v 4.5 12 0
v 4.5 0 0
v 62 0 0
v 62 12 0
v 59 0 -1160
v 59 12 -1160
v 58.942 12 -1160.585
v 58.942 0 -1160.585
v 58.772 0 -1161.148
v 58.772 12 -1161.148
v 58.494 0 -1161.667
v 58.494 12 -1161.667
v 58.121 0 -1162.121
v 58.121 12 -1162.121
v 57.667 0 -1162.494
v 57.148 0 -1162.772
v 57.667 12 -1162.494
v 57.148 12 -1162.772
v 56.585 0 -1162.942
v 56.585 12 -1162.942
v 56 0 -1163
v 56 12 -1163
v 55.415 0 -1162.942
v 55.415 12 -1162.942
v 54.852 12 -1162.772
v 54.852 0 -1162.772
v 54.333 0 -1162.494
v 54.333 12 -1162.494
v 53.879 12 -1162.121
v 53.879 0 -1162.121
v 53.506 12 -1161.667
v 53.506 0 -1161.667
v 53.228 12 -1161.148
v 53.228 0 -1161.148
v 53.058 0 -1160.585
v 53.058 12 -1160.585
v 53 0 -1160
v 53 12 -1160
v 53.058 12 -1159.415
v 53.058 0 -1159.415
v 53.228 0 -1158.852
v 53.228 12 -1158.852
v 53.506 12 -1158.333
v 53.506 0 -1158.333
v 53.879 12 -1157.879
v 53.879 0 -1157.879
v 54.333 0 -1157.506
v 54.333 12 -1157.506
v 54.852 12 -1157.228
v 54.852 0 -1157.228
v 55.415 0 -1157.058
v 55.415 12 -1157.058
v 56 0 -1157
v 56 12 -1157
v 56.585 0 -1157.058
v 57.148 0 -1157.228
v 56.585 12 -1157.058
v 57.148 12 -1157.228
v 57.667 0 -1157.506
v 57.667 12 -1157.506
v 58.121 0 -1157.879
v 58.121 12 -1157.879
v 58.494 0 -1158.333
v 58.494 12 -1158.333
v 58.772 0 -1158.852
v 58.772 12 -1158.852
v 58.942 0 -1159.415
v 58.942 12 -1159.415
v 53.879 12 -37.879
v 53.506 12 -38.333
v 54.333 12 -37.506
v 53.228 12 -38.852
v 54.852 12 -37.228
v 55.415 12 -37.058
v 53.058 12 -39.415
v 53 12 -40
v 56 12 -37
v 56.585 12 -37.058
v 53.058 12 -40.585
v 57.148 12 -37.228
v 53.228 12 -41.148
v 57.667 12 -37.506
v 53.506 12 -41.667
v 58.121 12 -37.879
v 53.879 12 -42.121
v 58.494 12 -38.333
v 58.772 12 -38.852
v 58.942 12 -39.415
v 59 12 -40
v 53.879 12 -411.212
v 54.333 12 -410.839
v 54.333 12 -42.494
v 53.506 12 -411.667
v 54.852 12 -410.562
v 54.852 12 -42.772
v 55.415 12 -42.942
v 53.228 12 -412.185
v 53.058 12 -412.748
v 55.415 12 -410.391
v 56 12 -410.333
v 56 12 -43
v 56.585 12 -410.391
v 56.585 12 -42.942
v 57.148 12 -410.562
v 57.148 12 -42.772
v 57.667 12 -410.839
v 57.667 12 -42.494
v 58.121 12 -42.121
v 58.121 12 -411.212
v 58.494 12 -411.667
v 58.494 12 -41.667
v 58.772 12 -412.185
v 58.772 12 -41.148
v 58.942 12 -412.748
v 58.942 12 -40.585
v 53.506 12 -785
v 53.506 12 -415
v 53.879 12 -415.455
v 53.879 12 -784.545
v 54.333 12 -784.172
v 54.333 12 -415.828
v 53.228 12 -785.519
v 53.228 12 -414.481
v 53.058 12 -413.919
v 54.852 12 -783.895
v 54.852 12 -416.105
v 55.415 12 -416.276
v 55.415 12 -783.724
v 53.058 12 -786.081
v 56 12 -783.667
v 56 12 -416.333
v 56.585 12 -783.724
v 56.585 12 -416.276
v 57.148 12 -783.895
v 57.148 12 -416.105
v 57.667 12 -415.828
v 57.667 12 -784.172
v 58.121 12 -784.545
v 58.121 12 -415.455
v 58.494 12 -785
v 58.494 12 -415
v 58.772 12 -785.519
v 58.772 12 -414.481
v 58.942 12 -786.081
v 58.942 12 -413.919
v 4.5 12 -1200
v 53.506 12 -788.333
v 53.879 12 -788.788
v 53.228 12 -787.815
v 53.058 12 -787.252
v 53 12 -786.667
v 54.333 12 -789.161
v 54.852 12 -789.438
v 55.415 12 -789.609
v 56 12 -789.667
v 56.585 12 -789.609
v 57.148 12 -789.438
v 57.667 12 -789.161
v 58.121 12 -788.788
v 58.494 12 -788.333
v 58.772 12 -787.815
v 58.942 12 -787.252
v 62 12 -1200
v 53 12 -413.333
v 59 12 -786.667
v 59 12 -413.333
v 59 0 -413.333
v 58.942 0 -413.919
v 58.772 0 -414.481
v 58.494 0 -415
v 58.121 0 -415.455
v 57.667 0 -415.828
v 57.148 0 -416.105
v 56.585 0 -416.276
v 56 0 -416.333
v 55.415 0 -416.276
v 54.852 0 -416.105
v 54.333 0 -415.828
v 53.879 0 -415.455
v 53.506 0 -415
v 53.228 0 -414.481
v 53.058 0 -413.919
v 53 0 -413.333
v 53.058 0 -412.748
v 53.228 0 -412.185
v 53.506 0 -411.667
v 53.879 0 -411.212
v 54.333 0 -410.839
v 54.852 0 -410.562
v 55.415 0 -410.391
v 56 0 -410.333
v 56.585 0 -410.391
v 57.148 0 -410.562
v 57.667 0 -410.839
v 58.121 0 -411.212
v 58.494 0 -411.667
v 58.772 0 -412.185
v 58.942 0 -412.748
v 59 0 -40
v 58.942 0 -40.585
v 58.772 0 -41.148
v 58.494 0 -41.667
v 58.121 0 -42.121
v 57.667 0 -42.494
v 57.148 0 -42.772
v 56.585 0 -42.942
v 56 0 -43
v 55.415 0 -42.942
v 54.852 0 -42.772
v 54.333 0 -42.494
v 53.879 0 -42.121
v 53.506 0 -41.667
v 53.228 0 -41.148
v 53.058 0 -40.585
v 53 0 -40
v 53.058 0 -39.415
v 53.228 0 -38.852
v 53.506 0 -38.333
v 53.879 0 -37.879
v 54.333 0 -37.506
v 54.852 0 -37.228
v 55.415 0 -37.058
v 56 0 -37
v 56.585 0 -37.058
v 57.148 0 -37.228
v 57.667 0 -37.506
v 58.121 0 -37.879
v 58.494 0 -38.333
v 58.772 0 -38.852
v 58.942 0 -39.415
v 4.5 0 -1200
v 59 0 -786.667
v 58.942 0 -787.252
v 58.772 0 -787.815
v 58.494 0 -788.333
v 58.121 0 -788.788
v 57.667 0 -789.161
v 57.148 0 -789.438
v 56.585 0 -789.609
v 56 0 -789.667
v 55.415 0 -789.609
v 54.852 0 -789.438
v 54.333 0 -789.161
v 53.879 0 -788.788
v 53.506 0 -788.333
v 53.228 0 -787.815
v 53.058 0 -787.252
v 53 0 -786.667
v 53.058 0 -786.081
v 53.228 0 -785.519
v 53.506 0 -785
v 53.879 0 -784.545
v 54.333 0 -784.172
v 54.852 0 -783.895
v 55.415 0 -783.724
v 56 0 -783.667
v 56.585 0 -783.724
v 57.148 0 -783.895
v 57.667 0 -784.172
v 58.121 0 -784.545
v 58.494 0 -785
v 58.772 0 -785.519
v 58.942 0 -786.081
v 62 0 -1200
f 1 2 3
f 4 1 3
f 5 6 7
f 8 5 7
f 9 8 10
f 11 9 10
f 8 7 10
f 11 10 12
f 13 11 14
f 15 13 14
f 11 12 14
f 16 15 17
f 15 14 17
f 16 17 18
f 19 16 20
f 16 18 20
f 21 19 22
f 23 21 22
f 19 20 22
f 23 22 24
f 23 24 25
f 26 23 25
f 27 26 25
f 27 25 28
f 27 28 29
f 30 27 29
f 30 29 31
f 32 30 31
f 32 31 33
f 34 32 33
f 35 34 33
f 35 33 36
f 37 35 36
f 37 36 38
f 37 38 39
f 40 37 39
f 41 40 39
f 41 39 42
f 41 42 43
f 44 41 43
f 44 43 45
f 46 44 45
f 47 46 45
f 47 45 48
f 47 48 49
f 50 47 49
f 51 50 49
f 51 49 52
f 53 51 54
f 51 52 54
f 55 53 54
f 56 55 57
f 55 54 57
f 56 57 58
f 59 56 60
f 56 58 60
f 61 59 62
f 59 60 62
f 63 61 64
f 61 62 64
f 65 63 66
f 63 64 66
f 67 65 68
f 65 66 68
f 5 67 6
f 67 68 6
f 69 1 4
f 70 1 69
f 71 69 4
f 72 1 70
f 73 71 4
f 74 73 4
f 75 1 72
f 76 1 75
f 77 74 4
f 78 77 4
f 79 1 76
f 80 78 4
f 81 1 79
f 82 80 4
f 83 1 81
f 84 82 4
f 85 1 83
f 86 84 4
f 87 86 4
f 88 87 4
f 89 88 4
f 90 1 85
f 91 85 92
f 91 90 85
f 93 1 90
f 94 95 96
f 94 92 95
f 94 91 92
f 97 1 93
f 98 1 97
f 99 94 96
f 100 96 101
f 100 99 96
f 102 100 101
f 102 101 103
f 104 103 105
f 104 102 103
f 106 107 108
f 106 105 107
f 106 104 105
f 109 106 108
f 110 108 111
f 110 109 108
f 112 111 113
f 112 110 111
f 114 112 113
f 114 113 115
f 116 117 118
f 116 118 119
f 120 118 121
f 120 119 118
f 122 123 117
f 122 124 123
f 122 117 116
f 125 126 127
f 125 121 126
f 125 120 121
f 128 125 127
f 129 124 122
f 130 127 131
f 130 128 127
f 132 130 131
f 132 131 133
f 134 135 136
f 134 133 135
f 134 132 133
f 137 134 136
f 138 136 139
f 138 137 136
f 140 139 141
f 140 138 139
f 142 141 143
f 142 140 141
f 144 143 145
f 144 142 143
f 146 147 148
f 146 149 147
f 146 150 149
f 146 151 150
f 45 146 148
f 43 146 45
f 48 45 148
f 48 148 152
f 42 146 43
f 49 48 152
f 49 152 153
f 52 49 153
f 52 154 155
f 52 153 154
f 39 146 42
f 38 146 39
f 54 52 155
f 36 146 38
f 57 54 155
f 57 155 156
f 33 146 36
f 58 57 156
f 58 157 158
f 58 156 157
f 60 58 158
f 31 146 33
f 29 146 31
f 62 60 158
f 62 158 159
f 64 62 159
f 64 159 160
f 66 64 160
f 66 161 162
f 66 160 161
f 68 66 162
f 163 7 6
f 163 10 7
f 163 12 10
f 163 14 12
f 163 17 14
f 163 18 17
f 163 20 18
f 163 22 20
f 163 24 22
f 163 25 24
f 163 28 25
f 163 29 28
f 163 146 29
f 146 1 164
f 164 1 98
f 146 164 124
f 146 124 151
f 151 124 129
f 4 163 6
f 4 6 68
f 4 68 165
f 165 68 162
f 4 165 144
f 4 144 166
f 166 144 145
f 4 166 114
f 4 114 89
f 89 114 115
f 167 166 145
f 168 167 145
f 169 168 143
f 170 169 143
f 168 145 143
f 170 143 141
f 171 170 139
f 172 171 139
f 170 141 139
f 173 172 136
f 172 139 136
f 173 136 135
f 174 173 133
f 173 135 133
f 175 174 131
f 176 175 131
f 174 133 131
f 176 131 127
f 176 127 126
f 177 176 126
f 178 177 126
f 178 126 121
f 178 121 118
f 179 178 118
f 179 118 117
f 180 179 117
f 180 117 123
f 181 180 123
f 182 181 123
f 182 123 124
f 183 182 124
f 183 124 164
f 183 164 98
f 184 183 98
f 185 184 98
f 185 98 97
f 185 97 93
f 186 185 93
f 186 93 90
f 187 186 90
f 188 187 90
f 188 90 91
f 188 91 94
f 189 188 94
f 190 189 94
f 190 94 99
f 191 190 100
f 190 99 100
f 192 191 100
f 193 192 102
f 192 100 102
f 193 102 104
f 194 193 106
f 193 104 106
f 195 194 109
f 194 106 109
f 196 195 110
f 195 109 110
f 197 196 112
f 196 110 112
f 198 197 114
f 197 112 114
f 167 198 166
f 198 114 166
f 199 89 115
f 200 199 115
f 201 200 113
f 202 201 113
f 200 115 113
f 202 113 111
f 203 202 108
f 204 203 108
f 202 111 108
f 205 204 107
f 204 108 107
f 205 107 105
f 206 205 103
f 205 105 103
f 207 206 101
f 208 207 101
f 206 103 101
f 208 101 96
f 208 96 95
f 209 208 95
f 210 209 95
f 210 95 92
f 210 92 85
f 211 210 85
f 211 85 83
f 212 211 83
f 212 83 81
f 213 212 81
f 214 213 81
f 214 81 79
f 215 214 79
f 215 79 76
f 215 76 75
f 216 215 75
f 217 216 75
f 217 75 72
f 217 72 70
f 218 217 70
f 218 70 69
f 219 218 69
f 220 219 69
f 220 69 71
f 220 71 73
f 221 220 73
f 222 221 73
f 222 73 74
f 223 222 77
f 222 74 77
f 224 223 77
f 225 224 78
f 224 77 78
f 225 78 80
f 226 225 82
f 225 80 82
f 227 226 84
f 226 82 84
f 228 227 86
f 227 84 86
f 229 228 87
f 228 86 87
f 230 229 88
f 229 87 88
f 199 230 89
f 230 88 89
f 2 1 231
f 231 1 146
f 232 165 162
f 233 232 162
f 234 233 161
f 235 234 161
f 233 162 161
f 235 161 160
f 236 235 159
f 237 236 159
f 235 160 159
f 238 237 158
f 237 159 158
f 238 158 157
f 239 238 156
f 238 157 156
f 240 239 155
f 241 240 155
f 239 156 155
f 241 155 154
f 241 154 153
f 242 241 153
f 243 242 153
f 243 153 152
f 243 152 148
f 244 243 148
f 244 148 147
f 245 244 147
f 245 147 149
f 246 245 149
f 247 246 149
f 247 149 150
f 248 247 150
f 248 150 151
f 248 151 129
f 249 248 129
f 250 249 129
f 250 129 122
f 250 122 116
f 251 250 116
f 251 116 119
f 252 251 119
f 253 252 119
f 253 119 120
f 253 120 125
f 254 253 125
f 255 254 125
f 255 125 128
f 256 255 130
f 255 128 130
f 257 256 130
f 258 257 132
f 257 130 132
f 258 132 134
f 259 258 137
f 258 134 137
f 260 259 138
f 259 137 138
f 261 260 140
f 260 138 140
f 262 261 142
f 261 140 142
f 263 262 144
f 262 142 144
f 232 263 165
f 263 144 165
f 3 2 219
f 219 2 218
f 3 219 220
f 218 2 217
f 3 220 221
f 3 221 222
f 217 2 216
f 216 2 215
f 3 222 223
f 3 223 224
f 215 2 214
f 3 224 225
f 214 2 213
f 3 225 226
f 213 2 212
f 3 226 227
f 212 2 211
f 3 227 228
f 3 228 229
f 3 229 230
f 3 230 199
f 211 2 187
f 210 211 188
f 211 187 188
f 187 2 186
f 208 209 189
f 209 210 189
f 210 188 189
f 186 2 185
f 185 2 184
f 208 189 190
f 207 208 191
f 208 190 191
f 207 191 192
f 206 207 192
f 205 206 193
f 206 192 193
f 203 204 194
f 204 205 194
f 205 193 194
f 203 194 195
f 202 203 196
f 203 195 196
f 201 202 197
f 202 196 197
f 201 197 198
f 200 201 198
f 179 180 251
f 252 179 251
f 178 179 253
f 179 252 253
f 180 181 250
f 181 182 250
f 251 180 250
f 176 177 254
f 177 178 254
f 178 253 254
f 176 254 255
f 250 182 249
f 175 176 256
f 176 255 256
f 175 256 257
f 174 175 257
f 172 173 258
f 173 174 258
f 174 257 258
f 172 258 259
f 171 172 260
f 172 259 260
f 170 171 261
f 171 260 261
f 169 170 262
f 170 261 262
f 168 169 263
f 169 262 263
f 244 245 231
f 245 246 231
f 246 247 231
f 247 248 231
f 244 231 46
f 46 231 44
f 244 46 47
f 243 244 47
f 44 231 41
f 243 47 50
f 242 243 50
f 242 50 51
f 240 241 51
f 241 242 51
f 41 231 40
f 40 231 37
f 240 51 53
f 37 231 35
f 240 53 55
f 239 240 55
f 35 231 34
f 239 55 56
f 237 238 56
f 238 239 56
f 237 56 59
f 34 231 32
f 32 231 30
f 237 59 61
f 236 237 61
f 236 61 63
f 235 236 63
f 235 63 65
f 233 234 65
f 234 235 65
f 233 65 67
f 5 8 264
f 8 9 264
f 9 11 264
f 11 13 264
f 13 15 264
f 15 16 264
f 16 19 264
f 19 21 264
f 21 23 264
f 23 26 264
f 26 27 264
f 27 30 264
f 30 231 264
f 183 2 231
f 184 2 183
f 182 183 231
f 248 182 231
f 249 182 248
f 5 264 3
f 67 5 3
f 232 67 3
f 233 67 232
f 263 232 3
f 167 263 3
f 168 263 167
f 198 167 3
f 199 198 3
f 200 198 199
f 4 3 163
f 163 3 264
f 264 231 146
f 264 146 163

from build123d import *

# Parameters (mm, degrees)
SKETCH1_W           = 62
SKETCH1_H           = 1200
BOSS_EXTRUDE1_DEPTH = 12
SKETCH2_R           = 3
CUT_EXTRUDE1_DEPTH  = 22
SKETCH3_W           = 8.753853417
SKETCH3_H           = 1524
CUT_EXTRUDE2_DEPTH  = 20


with BuildPart() as part:
    # Sketch1 → Boss-Extrude1 (new body)
    with BuildSketch(Plane(origin=(0, 0, 0), x_dir=(1, 0, 0), z_dir=(0, 1, 0))):
        with Locations((31, 600)):
            Rectangle(SKETCH1_W, SKETCH1_H)
    extrude(amount=BOSS_EXTRUDE1_DEPTH)

    # Sketch2 → Cut-Extrude1 (cut)
    with BuildSketch(Plane(origin=(0, 12, 0), x_dir=(1, 0, 0), z_dir=(0, 1, 0))):
        with Locations((56, 40)):
            Circle(SKETCH2_R)
        with Locations((56, 413.333333333)):
            Circle(SKETCH2_R)
        with Locations((56, 786.666666667)):
            Circle(SKETCH2_R)
        with Locations((56, 1160)):
            Circle(SKETCH2_R)
    extrude(amount=-CUT_EXTRUDE1_DEPTH, mode=Mode.SUBTRACT)

    # Sketch3 → Cut-Extrude2 (cut)
    with BuildSketch(Plane(origin=(0, 12, 0), x_dir=(1, 0, 0), z_dir=(0, 1, 0))):
        with Locations((0.123073291, 762)):
            Rectangle(SKETCH3_W, SKETCH3_H)
    extrude(amount=-CUT_EXTRUDE2_DEPTH, mode=Mode.SUBTRACT)


solid = part.part
